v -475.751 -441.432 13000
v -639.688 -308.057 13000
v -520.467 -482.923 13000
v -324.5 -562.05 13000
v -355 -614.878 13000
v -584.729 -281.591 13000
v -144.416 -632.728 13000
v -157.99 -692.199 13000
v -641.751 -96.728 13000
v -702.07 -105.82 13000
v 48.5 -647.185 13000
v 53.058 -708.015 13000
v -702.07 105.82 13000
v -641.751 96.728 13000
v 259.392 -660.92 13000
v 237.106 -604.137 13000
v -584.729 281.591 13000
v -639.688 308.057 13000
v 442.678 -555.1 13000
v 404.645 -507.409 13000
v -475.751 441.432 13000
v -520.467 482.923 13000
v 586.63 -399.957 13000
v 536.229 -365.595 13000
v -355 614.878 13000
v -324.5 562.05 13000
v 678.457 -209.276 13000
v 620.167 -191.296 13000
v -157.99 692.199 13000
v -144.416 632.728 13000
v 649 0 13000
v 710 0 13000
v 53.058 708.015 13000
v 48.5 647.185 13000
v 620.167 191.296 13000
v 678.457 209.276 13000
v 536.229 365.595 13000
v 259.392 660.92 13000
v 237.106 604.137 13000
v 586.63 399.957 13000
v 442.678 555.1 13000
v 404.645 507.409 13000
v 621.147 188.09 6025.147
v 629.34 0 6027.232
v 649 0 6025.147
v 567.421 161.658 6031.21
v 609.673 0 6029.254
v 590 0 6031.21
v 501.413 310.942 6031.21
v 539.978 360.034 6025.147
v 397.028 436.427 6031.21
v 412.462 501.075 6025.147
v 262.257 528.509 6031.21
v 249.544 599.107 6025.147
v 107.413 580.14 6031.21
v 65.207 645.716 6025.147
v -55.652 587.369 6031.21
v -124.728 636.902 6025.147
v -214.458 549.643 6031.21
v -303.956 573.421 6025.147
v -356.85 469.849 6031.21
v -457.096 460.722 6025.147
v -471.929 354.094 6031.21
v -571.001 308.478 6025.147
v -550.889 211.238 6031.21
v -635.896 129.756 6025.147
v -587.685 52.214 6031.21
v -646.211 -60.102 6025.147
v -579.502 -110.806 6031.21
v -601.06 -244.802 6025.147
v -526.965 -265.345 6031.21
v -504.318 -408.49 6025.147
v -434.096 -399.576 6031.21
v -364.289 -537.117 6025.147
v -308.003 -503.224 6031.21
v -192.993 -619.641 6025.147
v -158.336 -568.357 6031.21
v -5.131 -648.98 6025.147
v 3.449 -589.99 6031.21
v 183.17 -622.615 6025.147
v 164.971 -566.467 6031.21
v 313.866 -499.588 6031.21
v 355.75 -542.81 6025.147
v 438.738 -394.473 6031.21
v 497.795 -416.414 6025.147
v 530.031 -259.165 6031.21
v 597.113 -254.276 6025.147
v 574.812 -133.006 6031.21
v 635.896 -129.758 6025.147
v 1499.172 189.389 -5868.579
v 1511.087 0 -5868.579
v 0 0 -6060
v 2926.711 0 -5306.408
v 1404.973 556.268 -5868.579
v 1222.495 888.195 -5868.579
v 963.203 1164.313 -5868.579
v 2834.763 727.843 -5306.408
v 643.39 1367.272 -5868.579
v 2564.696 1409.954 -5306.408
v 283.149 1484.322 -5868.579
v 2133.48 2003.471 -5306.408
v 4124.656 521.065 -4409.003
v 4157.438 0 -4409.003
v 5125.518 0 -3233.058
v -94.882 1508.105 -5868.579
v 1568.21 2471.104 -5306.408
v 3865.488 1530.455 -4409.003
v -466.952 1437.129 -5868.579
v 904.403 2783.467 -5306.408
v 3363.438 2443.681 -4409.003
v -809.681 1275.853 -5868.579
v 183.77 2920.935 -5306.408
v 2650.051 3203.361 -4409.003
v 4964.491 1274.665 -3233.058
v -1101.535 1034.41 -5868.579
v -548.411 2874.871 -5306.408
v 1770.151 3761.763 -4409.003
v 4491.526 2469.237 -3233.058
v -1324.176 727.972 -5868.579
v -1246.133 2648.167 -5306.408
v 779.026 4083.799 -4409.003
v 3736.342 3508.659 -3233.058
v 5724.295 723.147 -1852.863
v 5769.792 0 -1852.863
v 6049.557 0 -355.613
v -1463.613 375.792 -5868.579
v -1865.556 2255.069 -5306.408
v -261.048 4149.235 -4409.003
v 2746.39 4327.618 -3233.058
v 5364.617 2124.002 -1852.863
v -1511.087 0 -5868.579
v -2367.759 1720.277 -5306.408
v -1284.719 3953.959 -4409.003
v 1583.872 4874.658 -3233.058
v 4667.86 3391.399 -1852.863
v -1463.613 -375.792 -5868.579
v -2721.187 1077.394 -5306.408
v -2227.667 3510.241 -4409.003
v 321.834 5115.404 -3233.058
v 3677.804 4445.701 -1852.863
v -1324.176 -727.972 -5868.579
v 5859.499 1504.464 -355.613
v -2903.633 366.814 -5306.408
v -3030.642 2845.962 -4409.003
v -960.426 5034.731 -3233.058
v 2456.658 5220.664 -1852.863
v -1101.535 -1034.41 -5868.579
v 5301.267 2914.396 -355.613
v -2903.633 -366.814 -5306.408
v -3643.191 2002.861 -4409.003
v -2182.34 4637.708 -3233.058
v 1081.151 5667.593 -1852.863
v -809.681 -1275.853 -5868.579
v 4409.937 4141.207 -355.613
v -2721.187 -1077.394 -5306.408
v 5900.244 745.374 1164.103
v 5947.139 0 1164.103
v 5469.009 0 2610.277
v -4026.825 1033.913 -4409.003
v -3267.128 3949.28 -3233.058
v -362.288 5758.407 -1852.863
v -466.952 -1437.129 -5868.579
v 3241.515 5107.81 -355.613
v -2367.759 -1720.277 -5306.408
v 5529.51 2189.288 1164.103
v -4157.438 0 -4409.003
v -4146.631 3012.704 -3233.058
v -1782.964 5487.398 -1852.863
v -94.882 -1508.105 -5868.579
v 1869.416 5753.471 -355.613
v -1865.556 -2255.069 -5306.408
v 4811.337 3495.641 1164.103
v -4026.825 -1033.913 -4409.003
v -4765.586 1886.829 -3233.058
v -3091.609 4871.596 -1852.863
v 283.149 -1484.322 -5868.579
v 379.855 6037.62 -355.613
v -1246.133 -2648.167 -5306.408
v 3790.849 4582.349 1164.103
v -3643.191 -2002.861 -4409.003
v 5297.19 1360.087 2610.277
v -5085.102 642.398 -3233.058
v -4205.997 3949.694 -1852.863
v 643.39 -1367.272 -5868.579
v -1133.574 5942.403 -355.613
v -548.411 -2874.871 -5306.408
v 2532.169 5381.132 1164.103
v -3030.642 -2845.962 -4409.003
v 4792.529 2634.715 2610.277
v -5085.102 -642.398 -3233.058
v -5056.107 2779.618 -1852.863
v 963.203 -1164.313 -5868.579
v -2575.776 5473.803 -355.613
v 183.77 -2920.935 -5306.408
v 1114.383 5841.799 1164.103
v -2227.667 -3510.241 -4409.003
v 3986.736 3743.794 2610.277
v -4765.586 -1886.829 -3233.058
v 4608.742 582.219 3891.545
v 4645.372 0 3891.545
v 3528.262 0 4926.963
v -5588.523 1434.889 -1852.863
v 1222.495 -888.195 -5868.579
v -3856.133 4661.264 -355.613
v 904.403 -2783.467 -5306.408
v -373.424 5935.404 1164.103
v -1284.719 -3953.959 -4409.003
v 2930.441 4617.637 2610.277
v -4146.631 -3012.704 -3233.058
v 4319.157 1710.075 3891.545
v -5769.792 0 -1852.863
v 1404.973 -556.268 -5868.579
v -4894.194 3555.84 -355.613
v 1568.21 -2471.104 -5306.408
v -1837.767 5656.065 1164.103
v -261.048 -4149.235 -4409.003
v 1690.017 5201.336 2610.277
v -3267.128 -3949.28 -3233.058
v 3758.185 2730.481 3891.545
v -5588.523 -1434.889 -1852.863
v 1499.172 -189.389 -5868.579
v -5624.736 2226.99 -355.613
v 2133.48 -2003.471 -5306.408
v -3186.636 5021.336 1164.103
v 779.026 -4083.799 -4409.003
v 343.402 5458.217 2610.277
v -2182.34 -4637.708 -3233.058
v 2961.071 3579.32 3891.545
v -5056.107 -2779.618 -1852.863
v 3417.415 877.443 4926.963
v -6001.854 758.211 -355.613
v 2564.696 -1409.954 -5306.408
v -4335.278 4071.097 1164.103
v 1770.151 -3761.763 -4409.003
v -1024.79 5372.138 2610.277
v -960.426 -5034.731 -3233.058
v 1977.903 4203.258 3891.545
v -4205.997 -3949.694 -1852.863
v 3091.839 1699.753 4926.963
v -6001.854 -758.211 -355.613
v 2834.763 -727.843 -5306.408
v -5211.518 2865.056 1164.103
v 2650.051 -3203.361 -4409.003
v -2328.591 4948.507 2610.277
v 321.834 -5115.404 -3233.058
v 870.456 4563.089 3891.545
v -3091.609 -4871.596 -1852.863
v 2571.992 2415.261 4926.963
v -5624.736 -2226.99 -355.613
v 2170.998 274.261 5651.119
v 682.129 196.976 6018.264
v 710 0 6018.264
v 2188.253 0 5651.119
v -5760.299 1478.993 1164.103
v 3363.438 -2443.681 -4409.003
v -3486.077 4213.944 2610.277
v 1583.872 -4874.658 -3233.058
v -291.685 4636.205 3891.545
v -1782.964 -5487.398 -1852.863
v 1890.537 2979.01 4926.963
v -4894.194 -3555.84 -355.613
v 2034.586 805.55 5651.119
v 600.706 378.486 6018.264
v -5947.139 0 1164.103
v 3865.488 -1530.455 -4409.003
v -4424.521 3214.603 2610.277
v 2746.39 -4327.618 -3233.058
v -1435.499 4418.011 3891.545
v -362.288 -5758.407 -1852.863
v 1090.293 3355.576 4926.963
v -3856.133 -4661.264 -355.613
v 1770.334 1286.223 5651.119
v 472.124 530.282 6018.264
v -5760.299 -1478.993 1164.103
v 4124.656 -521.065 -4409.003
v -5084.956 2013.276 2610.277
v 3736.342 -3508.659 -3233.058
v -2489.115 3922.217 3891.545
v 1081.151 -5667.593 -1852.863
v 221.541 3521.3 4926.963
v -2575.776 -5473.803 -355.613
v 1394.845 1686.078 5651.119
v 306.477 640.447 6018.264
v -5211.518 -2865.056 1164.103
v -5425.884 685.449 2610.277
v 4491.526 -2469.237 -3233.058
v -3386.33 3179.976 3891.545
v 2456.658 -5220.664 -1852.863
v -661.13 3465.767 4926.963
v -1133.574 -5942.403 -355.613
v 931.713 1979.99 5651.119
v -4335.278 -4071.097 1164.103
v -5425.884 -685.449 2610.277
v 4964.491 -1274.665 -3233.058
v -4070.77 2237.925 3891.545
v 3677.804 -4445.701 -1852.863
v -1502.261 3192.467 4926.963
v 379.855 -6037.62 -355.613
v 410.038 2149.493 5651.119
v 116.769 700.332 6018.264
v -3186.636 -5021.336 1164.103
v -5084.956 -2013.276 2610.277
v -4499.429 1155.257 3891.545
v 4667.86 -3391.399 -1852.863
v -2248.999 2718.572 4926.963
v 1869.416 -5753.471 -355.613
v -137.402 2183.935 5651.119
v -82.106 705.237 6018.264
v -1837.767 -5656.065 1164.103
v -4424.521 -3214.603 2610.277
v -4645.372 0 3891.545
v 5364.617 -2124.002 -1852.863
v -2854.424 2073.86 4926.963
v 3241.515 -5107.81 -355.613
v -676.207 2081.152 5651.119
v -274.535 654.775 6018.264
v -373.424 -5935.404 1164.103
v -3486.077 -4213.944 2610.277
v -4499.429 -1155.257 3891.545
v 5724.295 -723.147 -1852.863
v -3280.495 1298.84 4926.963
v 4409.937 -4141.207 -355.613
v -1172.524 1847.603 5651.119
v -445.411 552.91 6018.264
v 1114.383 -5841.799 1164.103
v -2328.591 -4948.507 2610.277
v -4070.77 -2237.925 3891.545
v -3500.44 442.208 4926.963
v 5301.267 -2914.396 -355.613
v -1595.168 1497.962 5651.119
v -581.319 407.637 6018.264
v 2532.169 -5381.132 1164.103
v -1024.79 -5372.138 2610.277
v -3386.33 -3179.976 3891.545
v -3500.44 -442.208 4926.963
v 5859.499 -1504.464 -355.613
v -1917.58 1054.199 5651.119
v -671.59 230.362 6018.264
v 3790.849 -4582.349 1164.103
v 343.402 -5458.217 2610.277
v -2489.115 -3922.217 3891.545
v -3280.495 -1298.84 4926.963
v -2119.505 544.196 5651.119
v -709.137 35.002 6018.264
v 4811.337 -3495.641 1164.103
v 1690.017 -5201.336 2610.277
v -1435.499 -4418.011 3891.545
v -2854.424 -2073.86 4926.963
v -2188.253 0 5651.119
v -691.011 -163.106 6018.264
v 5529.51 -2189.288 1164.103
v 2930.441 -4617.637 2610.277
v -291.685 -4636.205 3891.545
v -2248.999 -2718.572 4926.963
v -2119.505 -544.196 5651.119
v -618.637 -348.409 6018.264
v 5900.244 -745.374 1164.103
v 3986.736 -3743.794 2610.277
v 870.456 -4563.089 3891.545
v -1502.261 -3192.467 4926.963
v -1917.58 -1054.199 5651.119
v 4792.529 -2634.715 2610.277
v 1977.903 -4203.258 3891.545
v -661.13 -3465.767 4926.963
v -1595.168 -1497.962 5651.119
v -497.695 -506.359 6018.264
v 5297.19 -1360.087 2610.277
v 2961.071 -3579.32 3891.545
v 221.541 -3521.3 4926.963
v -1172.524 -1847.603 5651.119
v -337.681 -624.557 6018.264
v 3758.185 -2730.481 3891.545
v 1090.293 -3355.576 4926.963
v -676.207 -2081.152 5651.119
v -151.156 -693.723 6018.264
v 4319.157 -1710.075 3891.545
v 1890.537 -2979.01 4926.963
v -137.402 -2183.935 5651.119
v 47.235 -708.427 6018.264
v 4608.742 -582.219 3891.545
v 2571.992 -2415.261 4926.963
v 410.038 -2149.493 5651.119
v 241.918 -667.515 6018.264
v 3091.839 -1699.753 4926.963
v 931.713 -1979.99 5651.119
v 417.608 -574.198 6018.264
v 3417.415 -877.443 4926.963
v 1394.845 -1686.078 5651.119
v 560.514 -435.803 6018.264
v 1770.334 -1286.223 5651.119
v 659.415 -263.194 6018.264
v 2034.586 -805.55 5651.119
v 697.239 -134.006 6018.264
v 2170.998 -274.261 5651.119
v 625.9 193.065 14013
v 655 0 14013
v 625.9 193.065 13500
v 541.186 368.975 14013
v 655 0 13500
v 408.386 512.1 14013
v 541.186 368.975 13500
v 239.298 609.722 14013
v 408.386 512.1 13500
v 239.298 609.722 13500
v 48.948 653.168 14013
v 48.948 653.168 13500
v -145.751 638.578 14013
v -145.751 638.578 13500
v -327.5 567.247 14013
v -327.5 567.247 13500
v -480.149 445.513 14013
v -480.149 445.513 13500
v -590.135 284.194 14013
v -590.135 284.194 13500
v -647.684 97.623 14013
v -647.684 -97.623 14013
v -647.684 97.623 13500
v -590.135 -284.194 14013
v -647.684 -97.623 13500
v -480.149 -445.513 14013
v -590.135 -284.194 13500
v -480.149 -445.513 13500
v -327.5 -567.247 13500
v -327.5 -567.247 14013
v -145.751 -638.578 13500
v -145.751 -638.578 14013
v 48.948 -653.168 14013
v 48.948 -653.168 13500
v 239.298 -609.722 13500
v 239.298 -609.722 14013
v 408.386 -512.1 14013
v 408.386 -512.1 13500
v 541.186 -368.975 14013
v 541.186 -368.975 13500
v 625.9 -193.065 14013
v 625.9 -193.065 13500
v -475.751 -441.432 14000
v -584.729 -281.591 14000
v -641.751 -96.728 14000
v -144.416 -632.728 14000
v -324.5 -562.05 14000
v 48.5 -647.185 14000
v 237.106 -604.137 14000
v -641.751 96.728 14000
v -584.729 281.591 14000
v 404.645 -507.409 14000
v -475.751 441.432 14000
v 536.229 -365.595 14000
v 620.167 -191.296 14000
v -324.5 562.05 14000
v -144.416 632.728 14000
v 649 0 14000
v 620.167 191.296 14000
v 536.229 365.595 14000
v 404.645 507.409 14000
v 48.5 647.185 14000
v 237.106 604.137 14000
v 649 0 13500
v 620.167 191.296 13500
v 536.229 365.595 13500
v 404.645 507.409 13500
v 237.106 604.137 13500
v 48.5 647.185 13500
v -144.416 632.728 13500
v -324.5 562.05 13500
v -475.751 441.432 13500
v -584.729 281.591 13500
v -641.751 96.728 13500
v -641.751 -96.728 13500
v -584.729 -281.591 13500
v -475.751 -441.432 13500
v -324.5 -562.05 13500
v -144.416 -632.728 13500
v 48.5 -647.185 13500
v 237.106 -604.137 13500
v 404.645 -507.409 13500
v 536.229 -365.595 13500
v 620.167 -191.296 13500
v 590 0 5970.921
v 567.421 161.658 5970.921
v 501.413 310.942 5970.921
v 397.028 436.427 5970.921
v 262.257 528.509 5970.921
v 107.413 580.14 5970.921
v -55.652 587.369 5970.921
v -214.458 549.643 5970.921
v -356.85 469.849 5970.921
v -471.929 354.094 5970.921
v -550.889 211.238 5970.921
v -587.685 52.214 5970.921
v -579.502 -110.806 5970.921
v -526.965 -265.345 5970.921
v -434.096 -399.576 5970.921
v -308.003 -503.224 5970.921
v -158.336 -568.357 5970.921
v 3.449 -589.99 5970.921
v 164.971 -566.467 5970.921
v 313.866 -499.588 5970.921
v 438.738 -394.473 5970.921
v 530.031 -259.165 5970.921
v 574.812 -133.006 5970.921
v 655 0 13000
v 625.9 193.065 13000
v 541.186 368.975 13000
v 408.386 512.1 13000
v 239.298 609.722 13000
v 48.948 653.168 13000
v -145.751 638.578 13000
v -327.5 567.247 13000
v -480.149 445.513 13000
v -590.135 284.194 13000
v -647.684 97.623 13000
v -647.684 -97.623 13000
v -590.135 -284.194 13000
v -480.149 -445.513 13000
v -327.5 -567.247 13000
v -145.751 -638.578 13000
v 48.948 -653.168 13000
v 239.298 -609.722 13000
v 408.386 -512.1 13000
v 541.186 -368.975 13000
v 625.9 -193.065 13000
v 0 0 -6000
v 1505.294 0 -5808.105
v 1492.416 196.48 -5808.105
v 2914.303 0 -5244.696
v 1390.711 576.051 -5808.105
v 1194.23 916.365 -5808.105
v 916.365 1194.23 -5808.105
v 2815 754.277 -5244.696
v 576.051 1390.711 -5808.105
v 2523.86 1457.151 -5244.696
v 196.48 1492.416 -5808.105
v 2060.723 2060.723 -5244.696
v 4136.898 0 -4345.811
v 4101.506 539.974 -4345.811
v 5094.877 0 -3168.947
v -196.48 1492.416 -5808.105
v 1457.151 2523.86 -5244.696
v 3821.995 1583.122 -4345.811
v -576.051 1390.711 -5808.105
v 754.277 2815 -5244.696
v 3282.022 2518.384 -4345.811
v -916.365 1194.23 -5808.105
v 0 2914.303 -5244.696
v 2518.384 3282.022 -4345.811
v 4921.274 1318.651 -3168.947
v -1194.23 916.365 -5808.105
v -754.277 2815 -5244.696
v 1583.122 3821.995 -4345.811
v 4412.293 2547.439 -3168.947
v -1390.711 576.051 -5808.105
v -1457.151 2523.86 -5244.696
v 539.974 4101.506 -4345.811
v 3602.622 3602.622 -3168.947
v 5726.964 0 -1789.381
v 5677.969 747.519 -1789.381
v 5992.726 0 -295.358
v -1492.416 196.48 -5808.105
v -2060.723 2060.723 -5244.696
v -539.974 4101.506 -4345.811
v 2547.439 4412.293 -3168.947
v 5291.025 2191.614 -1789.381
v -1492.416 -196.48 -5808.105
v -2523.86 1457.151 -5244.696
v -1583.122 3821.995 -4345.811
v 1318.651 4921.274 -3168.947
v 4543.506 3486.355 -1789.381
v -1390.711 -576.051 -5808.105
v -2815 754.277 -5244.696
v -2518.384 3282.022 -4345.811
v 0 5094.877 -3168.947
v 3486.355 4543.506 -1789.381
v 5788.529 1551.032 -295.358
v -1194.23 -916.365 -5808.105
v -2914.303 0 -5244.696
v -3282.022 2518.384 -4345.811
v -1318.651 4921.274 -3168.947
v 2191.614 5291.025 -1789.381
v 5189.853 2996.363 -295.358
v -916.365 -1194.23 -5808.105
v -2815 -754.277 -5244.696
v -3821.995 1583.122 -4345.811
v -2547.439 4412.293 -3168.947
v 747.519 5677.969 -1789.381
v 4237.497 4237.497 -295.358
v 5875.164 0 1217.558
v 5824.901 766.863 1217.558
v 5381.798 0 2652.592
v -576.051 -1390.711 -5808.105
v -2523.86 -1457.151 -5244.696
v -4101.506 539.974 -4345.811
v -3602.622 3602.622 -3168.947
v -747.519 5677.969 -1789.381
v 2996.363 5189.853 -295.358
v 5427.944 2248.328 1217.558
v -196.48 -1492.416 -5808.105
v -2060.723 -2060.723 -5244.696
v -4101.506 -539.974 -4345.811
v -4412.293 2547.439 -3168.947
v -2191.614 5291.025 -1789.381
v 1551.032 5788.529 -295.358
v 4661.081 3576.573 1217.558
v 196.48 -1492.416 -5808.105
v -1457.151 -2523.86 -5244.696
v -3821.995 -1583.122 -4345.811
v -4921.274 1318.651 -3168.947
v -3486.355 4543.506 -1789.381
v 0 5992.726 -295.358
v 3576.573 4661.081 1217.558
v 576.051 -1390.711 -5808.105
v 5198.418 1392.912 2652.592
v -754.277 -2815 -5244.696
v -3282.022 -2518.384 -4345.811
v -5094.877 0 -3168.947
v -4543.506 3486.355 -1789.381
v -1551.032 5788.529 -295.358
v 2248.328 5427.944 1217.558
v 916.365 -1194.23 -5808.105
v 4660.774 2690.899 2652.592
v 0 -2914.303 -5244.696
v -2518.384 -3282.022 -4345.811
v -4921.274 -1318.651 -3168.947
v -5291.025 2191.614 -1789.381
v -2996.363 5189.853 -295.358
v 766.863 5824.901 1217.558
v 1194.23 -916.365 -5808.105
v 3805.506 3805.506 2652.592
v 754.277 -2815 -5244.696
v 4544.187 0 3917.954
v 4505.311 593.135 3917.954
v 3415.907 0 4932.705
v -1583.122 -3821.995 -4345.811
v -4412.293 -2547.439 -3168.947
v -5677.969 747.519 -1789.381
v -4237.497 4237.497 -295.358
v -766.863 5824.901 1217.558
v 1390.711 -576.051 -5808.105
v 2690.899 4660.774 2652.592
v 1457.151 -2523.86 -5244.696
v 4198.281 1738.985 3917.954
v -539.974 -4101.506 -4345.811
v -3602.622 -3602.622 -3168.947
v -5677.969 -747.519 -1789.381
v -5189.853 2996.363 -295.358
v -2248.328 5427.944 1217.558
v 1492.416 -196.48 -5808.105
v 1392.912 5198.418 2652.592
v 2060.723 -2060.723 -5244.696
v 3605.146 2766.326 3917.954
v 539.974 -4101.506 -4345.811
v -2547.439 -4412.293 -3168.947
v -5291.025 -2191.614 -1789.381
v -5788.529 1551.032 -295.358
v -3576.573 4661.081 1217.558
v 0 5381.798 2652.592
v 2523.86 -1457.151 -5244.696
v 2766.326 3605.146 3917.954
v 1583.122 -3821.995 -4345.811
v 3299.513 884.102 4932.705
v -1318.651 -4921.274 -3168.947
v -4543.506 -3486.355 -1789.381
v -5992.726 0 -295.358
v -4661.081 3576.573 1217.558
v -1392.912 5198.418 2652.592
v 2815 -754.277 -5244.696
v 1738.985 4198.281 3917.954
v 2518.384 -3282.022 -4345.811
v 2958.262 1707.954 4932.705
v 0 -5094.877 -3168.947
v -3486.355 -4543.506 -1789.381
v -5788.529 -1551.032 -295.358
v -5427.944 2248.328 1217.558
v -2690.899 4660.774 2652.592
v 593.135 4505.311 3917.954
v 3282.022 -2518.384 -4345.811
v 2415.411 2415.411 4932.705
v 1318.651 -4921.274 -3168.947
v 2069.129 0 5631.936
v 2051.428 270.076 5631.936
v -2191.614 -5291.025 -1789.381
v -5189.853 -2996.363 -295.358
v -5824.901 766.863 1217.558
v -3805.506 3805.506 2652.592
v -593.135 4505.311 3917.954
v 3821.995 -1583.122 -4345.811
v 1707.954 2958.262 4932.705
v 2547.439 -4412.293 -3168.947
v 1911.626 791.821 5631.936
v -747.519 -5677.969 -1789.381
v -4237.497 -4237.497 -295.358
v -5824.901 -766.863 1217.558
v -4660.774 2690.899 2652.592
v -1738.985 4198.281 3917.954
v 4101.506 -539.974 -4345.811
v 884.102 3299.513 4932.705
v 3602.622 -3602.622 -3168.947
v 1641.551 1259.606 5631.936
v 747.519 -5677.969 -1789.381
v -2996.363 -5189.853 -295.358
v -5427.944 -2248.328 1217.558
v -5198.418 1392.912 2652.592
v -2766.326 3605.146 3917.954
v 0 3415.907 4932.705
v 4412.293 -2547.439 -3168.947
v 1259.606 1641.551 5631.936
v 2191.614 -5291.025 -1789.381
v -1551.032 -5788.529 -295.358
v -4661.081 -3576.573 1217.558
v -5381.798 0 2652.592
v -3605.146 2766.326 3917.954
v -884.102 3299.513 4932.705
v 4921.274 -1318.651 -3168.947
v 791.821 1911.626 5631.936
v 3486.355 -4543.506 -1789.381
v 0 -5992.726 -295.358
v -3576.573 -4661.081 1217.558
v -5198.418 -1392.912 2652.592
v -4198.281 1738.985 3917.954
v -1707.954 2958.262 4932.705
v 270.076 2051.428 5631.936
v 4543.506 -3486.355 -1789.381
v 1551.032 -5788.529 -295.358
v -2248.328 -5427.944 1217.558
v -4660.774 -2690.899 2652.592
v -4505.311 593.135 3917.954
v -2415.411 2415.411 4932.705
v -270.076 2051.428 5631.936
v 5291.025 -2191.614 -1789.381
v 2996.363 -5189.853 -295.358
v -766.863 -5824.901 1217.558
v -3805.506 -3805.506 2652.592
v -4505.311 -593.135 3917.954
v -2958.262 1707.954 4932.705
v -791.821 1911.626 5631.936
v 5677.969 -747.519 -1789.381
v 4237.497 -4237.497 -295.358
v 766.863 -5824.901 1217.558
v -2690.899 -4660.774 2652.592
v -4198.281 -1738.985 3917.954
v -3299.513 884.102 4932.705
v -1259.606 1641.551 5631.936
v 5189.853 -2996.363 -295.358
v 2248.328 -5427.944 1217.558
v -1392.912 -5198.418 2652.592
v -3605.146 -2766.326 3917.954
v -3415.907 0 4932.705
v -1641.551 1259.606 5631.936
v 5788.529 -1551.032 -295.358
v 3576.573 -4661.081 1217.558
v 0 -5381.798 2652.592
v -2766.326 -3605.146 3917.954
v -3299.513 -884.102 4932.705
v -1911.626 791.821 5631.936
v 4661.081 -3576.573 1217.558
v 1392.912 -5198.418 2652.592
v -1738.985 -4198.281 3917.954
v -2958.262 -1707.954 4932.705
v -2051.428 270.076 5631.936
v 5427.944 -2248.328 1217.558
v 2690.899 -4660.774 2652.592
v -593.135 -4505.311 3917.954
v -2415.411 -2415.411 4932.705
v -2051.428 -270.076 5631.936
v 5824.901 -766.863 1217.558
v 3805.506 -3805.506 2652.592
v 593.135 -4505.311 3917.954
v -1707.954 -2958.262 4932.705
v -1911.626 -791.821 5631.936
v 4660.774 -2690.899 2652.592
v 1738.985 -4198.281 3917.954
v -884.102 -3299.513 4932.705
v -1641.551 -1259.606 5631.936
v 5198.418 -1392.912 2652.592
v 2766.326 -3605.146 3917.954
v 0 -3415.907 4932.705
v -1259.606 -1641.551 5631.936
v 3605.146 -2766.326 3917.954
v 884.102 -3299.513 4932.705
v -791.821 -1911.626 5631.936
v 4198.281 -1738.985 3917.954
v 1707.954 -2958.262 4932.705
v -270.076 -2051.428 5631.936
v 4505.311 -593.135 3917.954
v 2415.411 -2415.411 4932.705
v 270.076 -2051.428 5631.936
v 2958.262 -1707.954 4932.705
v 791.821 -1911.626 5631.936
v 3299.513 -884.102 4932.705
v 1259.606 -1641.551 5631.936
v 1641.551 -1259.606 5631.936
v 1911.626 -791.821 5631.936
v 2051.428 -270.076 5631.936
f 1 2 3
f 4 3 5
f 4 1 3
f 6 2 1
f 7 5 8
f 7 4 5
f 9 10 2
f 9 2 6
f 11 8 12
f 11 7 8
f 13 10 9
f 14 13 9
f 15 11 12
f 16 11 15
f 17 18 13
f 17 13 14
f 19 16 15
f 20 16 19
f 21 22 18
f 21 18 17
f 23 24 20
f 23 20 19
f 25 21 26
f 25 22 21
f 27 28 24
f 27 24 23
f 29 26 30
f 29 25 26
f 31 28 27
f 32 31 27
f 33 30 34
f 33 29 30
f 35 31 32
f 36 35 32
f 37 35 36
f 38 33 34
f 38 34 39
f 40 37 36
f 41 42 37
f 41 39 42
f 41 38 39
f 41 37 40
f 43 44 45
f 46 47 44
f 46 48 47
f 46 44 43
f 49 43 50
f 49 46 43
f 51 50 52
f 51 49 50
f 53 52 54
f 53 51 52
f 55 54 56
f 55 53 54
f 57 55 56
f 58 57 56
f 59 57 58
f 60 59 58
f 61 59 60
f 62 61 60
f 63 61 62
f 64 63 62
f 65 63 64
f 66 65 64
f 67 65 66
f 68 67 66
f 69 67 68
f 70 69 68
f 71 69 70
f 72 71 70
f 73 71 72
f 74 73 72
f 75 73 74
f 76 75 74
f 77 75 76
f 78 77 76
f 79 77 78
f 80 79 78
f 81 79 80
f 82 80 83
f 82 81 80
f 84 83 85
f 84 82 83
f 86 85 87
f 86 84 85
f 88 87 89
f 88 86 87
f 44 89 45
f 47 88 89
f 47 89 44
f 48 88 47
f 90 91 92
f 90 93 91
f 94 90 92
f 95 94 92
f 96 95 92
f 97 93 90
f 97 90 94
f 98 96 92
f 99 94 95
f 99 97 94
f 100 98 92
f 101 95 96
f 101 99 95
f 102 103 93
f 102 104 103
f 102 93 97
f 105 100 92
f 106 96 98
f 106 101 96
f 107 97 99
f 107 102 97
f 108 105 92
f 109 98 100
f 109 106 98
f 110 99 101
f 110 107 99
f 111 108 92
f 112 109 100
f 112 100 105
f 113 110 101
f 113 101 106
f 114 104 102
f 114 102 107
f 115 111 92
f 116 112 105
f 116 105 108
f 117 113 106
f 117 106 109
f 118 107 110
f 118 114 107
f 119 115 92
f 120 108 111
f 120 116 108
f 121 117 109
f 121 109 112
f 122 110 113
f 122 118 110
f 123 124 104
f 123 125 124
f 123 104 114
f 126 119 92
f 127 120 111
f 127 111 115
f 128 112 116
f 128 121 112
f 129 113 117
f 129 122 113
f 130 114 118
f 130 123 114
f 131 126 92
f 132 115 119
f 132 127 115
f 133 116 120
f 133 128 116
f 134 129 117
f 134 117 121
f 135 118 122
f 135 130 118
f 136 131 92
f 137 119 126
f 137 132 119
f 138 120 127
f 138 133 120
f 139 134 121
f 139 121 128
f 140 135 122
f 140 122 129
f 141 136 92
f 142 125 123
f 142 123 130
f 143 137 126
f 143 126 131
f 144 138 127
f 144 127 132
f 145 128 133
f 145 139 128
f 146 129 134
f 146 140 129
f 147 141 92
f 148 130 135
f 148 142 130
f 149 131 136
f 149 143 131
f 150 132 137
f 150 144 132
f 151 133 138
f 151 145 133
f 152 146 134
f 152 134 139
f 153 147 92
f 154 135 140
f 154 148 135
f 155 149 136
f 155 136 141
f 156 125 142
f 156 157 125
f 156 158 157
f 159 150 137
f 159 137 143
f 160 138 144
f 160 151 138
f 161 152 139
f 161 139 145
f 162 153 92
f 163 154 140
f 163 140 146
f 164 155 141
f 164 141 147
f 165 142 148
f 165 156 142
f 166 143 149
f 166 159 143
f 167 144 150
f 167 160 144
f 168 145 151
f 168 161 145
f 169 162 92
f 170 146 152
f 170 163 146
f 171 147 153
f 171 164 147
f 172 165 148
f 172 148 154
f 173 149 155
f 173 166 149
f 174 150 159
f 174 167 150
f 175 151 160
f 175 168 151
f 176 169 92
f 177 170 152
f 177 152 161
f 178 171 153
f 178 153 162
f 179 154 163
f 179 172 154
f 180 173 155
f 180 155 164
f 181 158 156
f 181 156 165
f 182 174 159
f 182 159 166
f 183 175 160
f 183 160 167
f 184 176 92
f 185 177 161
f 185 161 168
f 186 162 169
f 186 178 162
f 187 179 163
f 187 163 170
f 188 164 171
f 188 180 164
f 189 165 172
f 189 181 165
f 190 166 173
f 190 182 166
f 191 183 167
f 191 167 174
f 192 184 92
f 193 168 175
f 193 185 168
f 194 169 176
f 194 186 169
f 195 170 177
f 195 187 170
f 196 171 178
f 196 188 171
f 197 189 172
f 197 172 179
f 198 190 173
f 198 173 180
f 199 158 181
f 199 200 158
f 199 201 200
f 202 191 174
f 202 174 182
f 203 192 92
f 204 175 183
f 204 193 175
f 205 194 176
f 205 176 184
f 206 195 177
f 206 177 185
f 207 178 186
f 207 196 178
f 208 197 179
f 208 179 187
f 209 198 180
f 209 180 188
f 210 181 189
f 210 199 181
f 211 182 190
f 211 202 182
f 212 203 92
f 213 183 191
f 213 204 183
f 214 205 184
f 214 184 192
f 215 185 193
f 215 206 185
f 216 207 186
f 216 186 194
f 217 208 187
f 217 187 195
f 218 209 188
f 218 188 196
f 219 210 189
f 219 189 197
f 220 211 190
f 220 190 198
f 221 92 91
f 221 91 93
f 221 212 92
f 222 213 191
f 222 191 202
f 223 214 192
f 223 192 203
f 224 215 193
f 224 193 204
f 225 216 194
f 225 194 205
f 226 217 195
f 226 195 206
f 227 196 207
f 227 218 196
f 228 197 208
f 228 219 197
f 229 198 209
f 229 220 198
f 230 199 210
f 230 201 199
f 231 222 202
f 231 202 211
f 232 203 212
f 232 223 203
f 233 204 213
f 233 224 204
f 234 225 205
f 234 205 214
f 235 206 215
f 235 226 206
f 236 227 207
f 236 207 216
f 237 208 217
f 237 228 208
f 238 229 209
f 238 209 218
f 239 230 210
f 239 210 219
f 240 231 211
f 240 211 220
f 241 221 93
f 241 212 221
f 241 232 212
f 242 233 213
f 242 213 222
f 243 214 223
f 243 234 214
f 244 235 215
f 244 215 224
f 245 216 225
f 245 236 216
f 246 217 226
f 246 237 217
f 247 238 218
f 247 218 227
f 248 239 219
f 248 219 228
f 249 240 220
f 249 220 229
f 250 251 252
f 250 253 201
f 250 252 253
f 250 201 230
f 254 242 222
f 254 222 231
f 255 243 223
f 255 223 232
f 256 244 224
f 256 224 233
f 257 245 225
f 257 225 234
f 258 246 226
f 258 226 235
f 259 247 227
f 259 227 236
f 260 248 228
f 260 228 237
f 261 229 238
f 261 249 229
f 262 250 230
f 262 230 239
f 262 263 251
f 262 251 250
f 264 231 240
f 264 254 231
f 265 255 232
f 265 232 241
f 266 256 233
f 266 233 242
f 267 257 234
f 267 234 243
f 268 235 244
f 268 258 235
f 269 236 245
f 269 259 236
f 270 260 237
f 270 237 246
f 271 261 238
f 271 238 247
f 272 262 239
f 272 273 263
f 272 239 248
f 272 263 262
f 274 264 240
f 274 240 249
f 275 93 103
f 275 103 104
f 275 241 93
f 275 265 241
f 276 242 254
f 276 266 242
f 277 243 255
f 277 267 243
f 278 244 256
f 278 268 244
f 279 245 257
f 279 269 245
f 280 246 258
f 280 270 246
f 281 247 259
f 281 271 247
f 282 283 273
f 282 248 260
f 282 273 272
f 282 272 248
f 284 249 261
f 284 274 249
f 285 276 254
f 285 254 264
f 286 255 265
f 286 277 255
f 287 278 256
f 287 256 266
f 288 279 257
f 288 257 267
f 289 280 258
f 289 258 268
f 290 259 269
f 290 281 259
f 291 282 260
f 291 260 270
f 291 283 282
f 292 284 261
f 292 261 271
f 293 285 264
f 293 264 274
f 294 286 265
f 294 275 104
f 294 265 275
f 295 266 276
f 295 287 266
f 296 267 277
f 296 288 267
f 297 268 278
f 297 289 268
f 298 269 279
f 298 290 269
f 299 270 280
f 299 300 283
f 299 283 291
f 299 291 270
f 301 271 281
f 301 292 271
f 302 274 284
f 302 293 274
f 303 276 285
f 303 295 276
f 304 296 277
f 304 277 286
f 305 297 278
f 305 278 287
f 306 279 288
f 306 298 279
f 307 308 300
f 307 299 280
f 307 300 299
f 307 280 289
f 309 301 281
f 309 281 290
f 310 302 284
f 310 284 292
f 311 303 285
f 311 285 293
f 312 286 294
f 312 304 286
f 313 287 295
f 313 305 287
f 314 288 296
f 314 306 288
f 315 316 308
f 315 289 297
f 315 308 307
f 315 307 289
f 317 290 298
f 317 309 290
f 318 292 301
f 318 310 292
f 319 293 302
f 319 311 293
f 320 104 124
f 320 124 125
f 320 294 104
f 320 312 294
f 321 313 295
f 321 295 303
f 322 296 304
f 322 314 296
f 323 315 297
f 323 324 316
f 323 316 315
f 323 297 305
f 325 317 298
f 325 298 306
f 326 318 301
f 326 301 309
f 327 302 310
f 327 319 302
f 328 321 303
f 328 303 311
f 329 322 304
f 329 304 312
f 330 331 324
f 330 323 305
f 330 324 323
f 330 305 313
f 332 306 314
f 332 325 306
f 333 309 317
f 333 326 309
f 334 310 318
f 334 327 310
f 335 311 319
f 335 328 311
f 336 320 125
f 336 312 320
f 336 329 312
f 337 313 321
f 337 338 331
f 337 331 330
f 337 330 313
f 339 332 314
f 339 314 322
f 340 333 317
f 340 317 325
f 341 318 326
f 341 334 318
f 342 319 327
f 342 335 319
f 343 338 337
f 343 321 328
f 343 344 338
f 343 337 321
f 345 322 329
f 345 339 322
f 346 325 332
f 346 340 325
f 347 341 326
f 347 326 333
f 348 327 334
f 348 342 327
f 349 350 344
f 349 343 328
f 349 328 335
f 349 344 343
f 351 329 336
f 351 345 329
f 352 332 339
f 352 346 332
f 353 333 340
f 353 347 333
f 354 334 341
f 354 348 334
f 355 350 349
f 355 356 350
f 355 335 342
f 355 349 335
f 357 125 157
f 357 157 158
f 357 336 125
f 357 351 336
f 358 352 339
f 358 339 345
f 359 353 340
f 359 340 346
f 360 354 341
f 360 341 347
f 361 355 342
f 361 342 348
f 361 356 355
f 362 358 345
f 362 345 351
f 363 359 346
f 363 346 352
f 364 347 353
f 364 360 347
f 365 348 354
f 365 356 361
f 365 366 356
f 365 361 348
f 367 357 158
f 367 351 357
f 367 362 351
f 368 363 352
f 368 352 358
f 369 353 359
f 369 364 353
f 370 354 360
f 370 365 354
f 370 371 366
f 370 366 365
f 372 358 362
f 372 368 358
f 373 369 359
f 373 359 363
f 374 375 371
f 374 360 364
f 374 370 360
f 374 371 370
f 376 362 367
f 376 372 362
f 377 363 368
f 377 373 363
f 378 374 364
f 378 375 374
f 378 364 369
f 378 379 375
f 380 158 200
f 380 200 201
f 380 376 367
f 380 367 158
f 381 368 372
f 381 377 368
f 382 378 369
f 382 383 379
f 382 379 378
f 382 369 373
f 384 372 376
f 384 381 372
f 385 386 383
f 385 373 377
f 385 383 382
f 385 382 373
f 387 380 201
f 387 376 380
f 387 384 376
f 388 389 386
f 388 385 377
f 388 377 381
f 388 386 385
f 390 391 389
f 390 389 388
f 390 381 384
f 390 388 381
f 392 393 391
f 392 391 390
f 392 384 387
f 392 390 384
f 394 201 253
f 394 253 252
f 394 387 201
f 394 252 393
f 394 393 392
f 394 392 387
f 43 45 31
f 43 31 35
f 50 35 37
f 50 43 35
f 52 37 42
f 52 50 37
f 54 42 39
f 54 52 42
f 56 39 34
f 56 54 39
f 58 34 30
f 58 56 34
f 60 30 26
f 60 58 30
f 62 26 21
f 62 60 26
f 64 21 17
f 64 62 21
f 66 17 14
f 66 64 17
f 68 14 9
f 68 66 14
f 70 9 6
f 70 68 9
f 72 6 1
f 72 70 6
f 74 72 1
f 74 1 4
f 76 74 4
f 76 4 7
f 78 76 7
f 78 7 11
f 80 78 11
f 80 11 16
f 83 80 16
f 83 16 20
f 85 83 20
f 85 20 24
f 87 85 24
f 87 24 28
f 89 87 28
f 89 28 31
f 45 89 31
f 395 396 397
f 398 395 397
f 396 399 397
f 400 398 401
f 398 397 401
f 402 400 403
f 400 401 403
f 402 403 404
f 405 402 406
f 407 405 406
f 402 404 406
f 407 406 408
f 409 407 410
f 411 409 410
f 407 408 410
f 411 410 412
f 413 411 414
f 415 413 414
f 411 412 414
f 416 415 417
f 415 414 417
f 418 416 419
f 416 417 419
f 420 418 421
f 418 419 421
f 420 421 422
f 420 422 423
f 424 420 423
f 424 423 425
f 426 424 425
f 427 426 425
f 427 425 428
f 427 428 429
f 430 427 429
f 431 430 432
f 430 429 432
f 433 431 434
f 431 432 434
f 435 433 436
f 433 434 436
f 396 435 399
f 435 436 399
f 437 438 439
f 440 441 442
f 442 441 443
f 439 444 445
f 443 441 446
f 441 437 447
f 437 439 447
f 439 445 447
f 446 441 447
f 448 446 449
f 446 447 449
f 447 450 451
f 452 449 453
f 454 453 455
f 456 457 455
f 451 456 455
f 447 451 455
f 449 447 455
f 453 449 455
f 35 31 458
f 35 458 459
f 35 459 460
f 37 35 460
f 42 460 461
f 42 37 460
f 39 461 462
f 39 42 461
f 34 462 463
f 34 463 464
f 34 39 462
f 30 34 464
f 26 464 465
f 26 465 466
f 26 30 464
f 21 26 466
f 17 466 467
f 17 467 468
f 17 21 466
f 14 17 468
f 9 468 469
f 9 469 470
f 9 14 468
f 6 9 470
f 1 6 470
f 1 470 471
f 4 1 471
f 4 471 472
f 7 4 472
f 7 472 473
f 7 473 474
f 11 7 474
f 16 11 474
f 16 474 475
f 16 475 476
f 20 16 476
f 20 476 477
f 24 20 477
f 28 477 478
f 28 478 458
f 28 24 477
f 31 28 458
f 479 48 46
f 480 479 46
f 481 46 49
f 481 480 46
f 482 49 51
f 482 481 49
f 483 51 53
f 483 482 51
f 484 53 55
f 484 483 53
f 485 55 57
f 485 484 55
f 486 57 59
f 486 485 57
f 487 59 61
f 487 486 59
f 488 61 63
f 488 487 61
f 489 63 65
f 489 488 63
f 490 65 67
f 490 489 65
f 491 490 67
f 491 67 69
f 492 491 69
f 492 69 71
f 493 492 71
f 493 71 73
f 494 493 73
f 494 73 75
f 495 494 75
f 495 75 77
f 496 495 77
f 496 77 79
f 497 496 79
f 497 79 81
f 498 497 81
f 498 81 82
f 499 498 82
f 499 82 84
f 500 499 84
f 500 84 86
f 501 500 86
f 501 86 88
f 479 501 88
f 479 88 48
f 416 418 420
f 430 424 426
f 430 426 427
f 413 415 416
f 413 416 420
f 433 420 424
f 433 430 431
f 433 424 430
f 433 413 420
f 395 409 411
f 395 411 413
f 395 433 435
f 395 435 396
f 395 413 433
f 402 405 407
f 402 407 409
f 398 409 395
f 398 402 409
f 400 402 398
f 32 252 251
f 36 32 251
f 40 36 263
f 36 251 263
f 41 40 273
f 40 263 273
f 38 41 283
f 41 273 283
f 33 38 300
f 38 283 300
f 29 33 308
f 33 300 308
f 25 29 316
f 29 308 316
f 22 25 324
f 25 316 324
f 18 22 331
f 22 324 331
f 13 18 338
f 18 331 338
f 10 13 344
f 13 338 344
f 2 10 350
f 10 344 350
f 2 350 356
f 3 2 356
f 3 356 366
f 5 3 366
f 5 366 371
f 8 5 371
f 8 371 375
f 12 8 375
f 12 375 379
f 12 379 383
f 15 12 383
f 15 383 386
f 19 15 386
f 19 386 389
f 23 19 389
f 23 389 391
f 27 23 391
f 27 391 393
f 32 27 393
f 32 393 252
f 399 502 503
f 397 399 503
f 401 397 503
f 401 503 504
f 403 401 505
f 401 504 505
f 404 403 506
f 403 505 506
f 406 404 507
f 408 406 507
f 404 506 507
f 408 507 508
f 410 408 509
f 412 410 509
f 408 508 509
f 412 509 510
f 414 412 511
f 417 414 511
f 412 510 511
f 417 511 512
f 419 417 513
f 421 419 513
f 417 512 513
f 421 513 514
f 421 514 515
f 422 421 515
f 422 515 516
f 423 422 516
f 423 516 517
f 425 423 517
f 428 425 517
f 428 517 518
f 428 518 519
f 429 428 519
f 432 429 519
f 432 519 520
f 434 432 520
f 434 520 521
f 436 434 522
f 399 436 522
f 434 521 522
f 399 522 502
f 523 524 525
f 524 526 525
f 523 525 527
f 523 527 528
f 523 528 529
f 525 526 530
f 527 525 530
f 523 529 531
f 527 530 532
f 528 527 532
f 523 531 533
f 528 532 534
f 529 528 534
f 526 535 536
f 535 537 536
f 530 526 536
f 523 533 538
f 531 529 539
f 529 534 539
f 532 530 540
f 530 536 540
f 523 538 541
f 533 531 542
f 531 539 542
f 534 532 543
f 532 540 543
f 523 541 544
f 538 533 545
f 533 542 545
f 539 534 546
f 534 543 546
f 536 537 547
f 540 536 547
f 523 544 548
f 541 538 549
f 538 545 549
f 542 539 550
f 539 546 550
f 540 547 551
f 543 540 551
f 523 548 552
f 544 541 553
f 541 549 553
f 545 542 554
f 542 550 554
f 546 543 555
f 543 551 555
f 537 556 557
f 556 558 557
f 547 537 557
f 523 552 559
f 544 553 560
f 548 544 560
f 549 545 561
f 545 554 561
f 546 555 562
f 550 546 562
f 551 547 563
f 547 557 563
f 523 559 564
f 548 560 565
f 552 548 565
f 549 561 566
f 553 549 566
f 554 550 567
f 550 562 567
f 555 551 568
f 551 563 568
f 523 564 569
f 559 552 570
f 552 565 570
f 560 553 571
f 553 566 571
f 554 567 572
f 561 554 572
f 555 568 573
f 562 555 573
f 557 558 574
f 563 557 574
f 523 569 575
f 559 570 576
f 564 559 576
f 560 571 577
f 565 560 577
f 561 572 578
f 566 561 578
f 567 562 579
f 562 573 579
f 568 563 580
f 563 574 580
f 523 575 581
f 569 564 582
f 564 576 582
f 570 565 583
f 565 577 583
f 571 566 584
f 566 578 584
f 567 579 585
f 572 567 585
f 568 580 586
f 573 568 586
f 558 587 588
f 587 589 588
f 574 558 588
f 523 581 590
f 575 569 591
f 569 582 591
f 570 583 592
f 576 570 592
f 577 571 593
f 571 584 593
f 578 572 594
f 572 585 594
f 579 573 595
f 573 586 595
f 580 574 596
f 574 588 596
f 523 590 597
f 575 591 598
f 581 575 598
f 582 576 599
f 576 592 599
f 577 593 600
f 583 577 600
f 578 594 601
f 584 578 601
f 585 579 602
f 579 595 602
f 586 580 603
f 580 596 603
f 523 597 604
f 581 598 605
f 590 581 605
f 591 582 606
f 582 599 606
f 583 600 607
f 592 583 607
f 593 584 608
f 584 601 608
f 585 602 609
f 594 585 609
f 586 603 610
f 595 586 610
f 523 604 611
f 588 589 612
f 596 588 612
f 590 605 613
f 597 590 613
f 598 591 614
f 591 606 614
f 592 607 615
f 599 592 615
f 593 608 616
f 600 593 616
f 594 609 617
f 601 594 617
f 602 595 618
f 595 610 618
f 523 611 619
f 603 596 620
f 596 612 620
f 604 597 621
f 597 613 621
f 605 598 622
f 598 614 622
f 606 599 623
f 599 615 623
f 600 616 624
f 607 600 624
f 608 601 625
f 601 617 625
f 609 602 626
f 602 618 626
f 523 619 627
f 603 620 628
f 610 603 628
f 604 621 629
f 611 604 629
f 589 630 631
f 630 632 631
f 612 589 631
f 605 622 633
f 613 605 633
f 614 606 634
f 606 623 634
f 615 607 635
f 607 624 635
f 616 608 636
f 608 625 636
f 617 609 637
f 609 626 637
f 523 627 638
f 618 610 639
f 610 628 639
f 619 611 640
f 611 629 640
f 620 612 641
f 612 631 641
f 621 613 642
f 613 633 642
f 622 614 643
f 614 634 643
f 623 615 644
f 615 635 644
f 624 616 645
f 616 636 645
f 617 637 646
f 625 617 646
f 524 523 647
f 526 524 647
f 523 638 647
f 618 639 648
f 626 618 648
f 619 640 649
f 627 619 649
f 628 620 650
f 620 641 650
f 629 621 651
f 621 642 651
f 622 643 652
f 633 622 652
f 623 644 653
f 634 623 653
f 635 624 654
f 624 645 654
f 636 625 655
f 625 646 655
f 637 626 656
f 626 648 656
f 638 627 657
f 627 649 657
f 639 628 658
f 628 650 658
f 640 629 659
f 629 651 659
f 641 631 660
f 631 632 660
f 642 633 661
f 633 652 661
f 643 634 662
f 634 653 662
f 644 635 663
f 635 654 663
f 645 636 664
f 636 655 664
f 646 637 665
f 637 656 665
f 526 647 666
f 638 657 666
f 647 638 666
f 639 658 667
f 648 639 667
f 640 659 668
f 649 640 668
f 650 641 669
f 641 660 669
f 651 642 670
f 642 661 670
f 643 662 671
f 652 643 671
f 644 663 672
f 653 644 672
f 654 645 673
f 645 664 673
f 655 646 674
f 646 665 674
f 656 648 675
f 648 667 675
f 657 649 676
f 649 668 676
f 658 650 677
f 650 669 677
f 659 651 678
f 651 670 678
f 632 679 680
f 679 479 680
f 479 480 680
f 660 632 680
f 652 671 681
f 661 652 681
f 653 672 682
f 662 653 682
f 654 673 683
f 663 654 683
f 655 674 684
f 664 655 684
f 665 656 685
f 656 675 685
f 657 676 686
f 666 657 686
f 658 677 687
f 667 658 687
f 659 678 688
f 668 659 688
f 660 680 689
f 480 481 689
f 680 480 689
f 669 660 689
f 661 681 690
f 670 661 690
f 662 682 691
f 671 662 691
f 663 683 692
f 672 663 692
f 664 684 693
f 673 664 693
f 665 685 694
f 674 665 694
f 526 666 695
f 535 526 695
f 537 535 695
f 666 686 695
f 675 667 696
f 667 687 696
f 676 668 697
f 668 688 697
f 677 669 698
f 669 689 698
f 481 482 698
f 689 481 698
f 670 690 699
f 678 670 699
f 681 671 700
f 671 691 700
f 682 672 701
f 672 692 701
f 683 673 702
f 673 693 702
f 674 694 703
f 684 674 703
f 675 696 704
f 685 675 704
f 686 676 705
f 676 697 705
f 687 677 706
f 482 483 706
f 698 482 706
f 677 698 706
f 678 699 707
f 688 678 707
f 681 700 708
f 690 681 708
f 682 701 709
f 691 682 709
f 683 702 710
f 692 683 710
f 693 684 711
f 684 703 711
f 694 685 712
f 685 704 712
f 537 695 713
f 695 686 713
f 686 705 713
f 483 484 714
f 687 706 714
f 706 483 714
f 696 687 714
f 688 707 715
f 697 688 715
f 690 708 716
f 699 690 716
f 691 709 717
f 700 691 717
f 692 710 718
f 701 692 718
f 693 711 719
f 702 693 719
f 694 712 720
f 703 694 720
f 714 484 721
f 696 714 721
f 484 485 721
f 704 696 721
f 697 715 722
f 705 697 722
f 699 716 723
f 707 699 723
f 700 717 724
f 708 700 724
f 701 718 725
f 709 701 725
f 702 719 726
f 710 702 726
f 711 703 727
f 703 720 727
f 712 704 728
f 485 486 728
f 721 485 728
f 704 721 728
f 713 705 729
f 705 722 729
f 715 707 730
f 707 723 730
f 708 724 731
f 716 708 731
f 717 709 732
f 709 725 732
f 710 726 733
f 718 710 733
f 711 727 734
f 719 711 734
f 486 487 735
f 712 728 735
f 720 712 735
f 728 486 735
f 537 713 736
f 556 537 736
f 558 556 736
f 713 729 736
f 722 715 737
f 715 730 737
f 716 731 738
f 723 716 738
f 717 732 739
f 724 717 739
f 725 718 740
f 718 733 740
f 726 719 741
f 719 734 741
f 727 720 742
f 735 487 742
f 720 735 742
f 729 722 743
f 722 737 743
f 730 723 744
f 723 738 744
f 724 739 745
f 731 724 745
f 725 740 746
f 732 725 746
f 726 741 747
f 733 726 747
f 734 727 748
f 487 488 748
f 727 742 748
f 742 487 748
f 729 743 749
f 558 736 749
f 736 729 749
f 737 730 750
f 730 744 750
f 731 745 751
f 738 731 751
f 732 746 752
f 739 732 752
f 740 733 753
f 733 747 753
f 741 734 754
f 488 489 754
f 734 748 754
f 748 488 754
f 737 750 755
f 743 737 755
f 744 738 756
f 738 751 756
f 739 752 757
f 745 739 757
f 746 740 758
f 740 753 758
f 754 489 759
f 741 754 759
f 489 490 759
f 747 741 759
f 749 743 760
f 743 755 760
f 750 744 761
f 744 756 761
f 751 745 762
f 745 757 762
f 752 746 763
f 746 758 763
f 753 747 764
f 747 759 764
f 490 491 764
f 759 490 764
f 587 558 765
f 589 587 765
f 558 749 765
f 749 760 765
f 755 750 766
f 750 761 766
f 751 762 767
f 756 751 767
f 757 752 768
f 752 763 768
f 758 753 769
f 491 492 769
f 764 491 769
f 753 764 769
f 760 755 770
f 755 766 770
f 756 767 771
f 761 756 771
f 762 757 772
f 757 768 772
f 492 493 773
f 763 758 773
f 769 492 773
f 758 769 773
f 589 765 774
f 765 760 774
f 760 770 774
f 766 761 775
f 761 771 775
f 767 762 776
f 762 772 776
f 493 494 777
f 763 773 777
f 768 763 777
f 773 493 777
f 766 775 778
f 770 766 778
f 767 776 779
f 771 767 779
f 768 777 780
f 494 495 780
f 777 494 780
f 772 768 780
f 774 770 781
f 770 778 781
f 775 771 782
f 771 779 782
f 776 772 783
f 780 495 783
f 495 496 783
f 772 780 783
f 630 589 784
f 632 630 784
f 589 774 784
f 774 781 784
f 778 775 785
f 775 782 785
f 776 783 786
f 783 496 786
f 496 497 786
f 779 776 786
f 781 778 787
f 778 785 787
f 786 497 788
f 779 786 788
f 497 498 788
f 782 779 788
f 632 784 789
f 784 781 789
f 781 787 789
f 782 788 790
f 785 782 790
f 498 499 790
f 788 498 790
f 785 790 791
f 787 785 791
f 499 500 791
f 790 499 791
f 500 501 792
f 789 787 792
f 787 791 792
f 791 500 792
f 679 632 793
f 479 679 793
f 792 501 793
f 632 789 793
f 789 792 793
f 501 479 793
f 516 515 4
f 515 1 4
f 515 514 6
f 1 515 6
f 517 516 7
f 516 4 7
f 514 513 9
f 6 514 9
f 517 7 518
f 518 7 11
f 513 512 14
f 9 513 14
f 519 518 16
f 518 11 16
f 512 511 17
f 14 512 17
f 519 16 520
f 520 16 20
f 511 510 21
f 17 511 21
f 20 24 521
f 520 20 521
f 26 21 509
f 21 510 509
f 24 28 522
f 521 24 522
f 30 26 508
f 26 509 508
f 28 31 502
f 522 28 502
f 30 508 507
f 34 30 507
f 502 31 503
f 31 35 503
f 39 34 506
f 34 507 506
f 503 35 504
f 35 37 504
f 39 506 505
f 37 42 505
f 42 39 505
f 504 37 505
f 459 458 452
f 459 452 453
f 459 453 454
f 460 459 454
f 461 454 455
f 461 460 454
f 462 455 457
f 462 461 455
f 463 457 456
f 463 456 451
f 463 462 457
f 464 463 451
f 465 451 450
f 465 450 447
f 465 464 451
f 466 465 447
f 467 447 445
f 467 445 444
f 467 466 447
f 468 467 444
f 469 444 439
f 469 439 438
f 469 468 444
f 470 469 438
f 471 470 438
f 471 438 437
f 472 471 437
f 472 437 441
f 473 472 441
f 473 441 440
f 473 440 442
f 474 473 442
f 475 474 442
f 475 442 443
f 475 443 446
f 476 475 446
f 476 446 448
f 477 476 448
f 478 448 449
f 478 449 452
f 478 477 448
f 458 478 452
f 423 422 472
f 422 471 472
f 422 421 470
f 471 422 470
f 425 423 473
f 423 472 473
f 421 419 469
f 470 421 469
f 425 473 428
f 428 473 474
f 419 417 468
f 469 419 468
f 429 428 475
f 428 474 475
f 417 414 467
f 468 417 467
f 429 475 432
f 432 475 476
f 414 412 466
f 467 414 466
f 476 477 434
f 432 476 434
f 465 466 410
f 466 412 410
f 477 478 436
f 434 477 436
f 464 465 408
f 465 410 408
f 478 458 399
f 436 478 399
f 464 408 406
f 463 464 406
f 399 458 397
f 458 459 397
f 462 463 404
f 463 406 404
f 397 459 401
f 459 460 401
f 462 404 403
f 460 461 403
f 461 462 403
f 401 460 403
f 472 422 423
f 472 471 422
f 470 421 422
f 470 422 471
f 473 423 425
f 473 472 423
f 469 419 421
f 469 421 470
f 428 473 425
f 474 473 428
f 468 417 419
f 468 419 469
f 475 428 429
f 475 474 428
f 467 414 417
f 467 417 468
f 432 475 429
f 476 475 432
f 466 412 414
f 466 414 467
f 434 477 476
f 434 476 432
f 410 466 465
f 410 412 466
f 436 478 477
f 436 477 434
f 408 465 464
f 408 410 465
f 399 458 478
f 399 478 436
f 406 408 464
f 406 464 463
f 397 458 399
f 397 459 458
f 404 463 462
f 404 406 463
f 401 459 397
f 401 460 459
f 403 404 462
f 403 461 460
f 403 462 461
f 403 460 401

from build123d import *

# Parameters (mm, degrees)
TUBE_R            = 710
TUBE_R_2          = 649
TUBE_DEPTH        = 7000
CYLINDER_R        = 590
CYLINDER_DEPTH    = 1000
TUBE001_R         = 655
TUBE001_R_2       = 649
TUBE001_DEPTH     = 500
CYLINDER001_R     = 655
CYLINDER001_DEPTH = 13
TUBE002_R         = 655
TUBE002_R_2       = 649
TUBE002_DEPTH     = 500


with BuildPart() as tube:
    # Tube → Tube (new body)
    with BuildSketch(Plane.XY.offset(6000)):
        Circle(TUBE_R)
        Circle(TUBE_R_2, mode=Mode.SUBTRACT)
    extrude(amount=TUBE_DEPTH)


with BuildPart() as cylinder:
    # Cylinder → Cylinder (new body)
    with BuildSketch(Plane.XY.offset(5950)):
        Circle(CYLINDER_R)
    extrude(amount=CYLINDER_DEPTH)


with BuildPart() as sphere:
    # Sphere → Sphere (revolve)
    with BuildSketch(Plane.XZ):
        with BuildLine():
            ThreePointArc((0, -6000), (6000, 0), (0, 6000))
            Line((0, 6000), (0, -6000))
        make_face()
    revolve(axis=Axis((0, 0, 0), (0, 0, 1)))


with BuildPart() as fusion:
    # Sphere001 → Sphere001 (revolve)
    with BuildSketch(Plane.XZ):
        with BuildLine():
            ThreePointArc((0, -6060), (6060, 0), (0, 6060))
            Line((0, 6060), (0, -6060))
        make_face()
    revolve(axis=Axis((0, 0, 0), (0, 0, 1)))

    # Cut: cut Sphere
    add(sphere.part, mode=Mode.SUBTRACT)

    # Cut001: cut Cylinder
    add(cylinder.part, mode=Mode.SUBTRACT)

    # Fusion: union Tube
    add(tube.part)


with BuildPart() as tube001:
    # Tube001 → Tube001 (new body)
    with BuildSketch(Plane.XY.offset(13000)):
        Circle(TUBE001_R)
        Circle(TUBE001_R_2, mode=Mode.SUBTRACT)
    extrude(amount=TUBE001_DEPTH)


with BuildPart() as cylinder001:
    # Cylinder001 → Cylinder001 (new body)
    with BuildSketch(Plane.XY.offset(14000)):
        Circle(CYLINDER001_R)
    extrude(amount=CYLINDER001_DEPTH)


with BuildPart() as fusion001:
    # Tube002 → Tube002 (new body)
    with BuildSketch(Plane.XY.offset(13500)):
        Circle(TUBE002_R)
        Circle(TUBE002_R_2, mode=Mode.SUBTRACT)
    extrude(amount=TUBE002_DEPTH)

    # Fusion001: union Cylinder001
    add(cylinder001.part)


solid = Compound([fusion.part, tube001.part, fusion001.part])
